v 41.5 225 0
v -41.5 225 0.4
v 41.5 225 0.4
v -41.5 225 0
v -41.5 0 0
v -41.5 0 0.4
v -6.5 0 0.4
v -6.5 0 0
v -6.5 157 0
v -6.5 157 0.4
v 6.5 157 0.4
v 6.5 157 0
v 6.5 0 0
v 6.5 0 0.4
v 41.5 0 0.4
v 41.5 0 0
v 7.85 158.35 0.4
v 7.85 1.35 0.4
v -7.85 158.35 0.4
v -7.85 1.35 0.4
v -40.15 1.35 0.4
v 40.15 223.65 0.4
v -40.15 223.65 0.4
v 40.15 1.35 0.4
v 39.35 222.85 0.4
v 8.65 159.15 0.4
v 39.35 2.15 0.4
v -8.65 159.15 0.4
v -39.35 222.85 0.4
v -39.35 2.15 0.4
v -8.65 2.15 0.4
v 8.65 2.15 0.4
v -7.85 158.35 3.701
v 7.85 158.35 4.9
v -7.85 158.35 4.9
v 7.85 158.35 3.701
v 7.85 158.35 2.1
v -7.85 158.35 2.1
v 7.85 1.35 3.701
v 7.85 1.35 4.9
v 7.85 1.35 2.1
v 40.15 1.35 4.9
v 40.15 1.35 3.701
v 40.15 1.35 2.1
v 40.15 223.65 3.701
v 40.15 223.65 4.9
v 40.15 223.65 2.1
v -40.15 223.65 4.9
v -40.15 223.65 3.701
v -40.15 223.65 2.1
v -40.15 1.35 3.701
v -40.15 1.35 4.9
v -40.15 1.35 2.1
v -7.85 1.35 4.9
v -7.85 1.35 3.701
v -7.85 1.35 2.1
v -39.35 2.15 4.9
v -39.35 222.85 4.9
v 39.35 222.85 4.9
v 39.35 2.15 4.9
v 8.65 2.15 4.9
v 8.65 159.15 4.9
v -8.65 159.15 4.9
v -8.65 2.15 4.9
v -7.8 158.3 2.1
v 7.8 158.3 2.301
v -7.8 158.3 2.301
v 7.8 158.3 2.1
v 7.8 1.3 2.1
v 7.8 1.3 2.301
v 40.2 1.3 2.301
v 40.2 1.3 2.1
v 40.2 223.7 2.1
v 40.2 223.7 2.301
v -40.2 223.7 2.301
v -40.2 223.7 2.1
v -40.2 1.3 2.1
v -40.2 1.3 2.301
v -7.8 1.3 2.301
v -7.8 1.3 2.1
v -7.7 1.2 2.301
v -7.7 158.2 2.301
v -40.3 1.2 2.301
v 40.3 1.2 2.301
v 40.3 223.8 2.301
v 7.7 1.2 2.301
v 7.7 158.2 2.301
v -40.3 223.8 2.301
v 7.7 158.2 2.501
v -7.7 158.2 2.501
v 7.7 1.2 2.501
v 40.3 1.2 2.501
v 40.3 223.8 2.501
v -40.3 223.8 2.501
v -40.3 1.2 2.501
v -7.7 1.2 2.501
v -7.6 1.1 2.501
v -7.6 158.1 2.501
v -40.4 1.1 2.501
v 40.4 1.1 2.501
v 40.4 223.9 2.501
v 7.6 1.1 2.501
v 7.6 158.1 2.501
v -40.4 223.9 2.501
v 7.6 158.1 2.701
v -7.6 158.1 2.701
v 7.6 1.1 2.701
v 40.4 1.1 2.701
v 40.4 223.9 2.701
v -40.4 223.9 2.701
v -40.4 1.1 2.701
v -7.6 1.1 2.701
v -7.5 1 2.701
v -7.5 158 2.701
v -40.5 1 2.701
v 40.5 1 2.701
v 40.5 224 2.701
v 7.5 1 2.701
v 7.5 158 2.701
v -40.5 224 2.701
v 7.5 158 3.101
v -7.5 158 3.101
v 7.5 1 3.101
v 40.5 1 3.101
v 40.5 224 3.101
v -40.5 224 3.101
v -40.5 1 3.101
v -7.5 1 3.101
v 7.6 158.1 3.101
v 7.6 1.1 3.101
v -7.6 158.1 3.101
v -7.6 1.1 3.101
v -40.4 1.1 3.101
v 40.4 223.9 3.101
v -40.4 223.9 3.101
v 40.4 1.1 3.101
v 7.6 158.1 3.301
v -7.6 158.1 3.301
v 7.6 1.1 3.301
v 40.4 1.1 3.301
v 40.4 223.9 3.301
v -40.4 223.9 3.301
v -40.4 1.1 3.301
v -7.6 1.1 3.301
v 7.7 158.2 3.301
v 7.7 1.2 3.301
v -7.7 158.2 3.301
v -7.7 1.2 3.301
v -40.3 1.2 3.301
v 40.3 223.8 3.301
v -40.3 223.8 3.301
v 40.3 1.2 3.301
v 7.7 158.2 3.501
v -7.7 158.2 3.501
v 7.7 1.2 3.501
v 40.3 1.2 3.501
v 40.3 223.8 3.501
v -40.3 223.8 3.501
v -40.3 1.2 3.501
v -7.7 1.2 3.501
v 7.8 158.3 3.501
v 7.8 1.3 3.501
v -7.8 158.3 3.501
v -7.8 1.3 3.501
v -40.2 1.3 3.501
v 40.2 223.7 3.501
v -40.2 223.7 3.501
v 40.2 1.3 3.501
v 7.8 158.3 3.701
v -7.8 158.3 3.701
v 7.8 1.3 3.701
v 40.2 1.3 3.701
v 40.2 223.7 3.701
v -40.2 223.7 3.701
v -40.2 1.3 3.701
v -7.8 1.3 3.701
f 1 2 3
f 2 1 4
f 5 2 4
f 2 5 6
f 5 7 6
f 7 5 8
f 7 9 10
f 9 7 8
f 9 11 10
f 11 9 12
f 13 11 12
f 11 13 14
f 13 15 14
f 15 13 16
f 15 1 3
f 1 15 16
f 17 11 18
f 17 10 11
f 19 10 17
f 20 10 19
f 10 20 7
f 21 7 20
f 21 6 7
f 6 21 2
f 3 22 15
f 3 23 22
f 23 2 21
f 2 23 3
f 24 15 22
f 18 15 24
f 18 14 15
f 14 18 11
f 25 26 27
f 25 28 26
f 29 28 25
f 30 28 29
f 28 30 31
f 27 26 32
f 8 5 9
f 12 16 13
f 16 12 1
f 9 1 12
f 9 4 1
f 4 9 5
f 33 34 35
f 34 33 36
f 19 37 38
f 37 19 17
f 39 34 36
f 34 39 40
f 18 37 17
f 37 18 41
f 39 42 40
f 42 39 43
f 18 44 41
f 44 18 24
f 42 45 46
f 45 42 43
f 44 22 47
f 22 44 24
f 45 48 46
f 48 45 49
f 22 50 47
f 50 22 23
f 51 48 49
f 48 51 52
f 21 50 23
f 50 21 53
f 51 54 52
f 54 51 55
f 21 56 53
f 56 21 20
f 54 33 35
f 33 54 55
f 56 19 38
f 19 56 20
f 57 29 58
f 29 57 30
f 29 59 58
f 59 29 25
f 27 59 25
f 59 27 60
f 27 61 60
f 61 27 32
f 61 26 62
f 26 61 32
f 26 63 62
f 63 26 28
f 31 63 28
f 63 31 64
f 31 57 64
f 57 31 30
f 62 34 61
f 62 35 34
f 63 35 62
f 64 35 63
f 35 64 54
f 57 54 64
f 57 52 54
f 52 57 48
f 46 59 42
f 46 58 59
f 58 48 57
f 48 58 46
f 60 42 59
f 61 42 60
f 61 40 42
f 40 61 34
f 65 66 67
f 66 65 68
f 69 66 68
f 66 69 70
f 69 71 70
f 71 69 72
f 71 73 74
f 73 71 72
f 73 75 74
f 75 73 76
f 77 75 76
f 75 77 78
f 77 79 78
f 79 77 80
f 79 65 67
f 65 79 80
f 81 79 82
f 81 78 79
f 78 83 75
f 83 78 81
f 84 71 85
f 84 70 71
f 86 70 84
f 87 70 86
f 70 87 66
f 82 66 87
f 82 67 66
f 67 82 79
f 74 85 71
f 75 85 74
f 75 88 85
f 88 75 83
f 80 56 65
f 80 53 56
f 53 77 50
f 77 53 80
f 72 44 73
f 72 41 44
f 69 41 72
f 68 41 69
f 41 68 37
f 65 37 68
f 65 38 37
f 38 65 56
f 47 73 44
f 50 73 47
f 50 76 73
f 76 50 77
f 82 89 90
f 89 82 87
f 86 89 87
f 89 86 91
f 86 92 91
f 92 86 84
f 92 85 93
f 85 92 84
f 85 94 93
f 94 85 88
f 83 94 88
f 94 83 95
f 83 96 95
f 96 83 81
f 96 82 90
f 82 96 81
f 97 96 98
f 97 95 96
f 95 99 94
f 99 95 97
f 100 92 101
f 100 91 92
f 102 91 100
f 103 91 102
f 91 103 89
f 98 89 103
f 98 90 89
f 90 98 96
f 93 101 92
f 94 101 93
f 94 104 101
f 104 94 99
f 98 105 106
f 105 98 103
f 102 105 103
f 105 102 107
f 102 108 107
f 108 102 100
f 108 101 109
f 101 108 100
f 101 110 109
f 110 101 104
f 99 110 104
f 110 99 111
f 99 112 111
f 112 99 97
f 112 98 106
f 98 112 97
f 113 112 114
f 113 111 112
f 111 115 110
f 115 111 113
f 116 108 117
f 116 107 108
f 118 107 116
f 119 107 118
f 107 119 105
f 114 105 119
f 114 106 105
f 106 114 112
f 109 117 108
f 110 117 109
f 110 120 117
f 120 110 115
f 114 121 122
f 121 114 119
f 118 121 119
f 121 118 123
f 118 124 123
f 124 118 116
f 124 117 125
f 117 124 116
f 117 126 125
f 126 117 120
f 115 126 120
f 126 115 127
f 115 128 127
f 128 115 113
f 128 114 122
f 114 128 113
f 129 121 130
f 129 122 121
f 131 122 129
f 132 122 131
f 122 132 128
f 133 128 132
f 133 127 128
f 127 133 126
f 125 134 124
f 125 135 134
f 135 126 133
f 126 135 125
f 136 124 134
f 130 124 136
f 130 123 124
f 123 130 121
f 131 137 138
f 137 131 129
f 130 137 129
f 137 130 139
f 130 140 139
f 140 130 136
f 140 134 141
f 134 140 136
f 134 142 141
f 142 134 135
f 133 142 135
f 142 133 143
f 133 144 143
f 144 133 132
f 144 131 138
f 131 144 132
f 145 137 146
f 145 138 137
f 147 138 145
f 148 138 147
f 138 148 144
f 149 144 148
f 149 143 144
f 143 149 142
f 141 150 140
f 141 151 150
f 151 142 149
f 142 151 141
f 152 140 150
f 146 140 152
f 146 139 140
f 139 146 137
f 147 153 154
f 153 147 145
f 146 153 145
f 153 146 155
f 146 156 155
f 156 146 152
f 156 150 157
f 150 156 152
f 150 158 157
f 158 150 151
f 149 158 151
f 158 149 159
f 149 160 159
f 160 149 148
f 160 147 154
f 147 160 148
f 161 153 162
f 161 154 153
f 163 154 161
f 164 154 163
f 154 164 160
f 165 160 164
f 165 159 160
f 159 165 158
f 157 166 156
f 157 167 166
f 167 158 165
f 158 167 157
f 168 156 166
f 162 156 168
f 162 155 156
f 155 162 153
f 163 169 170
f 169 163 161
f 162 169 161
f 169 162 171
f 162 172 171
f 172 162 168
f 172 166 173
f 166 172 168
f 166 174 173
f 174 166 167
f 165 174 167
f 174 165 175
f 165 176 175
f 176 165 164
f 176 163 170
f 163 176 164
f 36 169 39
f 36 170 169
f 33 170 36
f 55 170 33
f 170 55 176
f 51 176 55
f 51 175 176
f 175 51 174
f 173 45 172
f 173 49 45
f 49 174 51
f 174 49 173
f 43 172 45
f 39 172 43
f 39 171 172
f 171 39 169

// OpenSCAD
// ==========================================================================
//  GENERATED FILE -- DO NOT EDIT.
//  Produced by build/build.py from components/Sand_Ballast_Container_Lid.scad
//  Turtle Body version 6.7.4
//  Edit lib/ and src/ instead, then run: python3 build/build.py
// ==========================================================================
/*
 Hope Turtle sand ballast container -- lid (snap-on lid). Units: mm. License: CERN-OHL-S-2.0.
 EXPERIMENTAL -- not built, filled or tested.
 A 3D-printed U-shaped box that slides into the gap between the bottom
 bottle's base and the ballast's orange bottom board, its two arms either
 side of the yellow ballast fin. Fill the tray with sand, click the lid on,
 slide it under the bottle. Walls 0.4 mm (one extrusion line).
 Print plate down, skirt up (part="print", the default) -- no support.
 The matching tray is Sand_Ballast_Container_Bottom.scad.

 SOURCE FILE — geometry lives in lib/sand_ballast.scad + lib/params.scad.
 The committed self-contained file is generated by build/build.py.
*/

/* [Display] */
part = "print"; // [print,closed]  -- print = this piece alone in its print pose; closed = tray + lid together

// [bundle] begin use <../../lib/sand_ballast.scad>
// ==========================================================================
//  Turtle Body -- sand ballast container  (lib module)  EXPERIMENTAL
// --------------------------------------------------------------------------
//  A 3D-printed U-shaped box (bottom tray + snap-on lid) that the builder
//  fills with sand, clicks shut and slides into the gap between the bottom
//  (+Y port) bottle's base and the ballast's orange bottom board. The two
//  arms of the U pass either side of the yellow ballast fin; the U's closed
//  end (the bridge) lies past the board's back edge. Tight under the bottle,
//  it holds the bottle in place.
//
//  Ballast-local frame (lib/ballast_fin.scad): board on Z 0..t, board long
//  axis X, board width Y 0..bl_board_w(); bottle axis at
//  [bl_center_slot(), bl_core_w()/2]; yellow fin centred on X =
//  bl_center_slot(), running from Y = bl_center_slot_depth() +
//  bl_fin_slot_depth() toward -Y.
//
//  Box frame (this file): X across the box, centred on the fin slot; Y = 0
//  at the open (fin-side) end, +Y toward the bridge; Z = 0 the floor
//  underside. sb_installed() maps it into the ballast-local frame.
//
//  Not built, filled or tested. 0.4 mm walls are a single extrusion line.
//
//  Definitions only. Geometry is emitted by the modules below.
// ==========================================================================

// [bundle] begin use <params.scad>
// ==========================================================================
//  Turtle Body -- shared dimension contract
// --------------------------------------------------------------------------
//  The single source of truth for every dimension that more than one
//  subsystem depends on. Values are exposed as zero-argument functions so
//  this file can be pulled in with `use <params.scad>` (which ignores
//  top-level variable assignments) without polluting any namespace.
//
//  lib/ modules take these as DEFAULT argument values:
//      module control_cap(roof_t = p_cap_roof_t(), ...) { ... }
//  so a src/ wrapper can still override one value from its customizer block
//  while every other subsystem keeps the shared number.
//
//  Rules:
//   * one function per concept, canonical name (see CLAUDE.md cross-file table)
//   * derived values are functions of other p_*() functions, never re-typed
//   * mm throughout; names say _d (diameter), _r (radius), _t (thickness),
//     _len / _h (axial), _af (hex across-flats)
//   * do NOT add a bare `x = ...;` here -- bundle.py / lint.py will reject it
// ==========================================================================

// ---- tolerances and render quality --------------------------------------
function p_eps()          = 0.02;   // Boolean overlap / cut-through fudge
function p_fit_clearance() = 0.2;   // wood joint: TOTAL extra slot width, centred on the board
function p_fn_plastic()   = 120;    // printed PLA parts (cap, cage, axle, mold)
function p_fn_wood()      = 96;     // cut wooden parts
function p_fn_curve()     = 180;    // fine profile curves (bottle, sails)

// ---- bottle (the foundation reference) ---------------------------------
function p_bottle_d()        = 84;    // outside diameter (was 86, and 82 before that; other bottle dims held)
function p_bottle_h()        = 305;   // total height incl. ordinary screw cap
function p_bottle_wall_t()   = 0.5;   // modelling assumption, not a measurement
function p_bottle_cap_d()    = 31;    // ordinary screw cap (NOT the control-cap disk)
function p_bottle_cap_h()    = 17;    // ordinary screw cap height (rear-fin / ballast formulas)
function p_collar_d()        = 34;    // bottle collar, independent of cap diameter
function p_top_dome_h()      = 62;
function p_bottom_dome_h()   = 25;
function p_dome_power()      = 2.5;   // superellipse exponent
function p_bottle_neck_h()   = 5;
function p_bottle_collar_h() = 1;
function p_bottle_neck_d()   = p_bottle_cap_d() - 3;   // 28: neck is 3 mm under the cap
function p_bottle_base_ratio() = 0.88; // slightly narrower footprint at the base
function p_bottle_profile_steps() = 16;
// cut bottle (control head): the lower dome is removed and a short socket is
// bored so the control-cap insert slides in. Cut plane sits 5 mm above the
// bottom dome height.
function p_bottle_cut_extra()  = 5;
function p_bottle_cut_height() = p_bottom_dome_h() + p_bottle_cut_extra();   // 30

// nominal bottle interior and the cap insert that enters it
function p_bottle_socket_d() = p_bottle_d() - 2 * p_bottle_wall_t();          // 81
function p_insert_shaft_radial_clearance() = 1;
function p_insert_shaft_d()  = p_bottle_socket_d()
                             - 2 * p_insert_shaft_radial_clearance();          // 79

// ---- wooden stock -----------------------------------------------------
function p_wood_t()          = 12;    // shared board / slat thickness
function p_fin_board_w()     = 93;    // shared fin-system stock width
function p_screw_side_offset() = 17;  // mounting-hole inset from a John end (was 25 until v4.2.0)

// ---- Ecojoiner port --------------------------------------------------
// A port must swallow the bottle's tapered top (the top dome) plus a seating
// allowance, so its axial length is DERIVED from the bottle, not fixed. This
// is the same rule the HopeTurtles.org generators use
// (port_length = taper_height + port_allowance); until 2026-09-08 lib carried
// the evaluated constant 82 instead, which silently broke the rule for any
// bottle other than the reference one. Ballast and Ecojoiner both read it.
function p_port_allowance()  = 20;                 // seating allowance beyond the dome
function p_port_length()     = p_top_dome_h() + p_port_allowance();   // 62 + 20 = 82
function p_port_height()     = p_bottle_d();       // opening height == bottle diameter (asserted)

// ---- M6 hardware ---------------------------------------------------
function p_m6_clearance_d()  = 6.4;   // M6 clearance hole
function p_m6_bolt_shaft_d() = 6;     // visual placeholder only
function p_m6_bolt_head_d()  = 12;
function p_m6_bolt_head_t()  = 4;

// ---- Ecojoiner bottle clamp: M5 cap screws + acorn nuts (v5.0.0/v5.1.0) --
// Replaces the M6 bolt + 12 mm presser disk. Each John port end carries TWO
// black M5 x 30 socket-head cap screws, stacked across the John height (one
// above, one below the centreline). v5.1.0: no nut -- each screw BITES into
// a 5.2 mm hole in the wood (builder's research; not verified here), so the
// screw itself holds its position and is adjusted with a hex key from
// outside. A black acorn (cap) nut, run fully onto the tip, bears on the
// bottle. Hardware sizes are ISO 4762 / DIN 1587 nominals for visual and
// stack checks only -- measure the hardware you buy.
// Bite-fit hole (was 5.5 clearance in v5.0.0). NOTE it is slightly LARGER
// than the 5 mm nominal major diameter: the hold relies on wood fibre
// springback around the thread, per the builder's own tests -- unverified
// here, and likely to vary with species, moisture and drill quality.
function p_m5_hole_d()           = 5.2;
function p_m5_bolt_d()           = 5;     // visual shank (plain cylinder)
function p_m5_bolt_len()         = 30;    // shank length under the head
function p_m5_head_d()           = 8.5;   // ISO 4762 socket head
function p_m5_head_h()           = 5;
function p_m5_acorn_af()         = 8;
function p_m5_acorn_h()          = 10;    // overall, hex base to dome tip
function p_m5_acorn_thread_depth() = 7;   // usable thread before the bolt bottoms
// Pair layout, shared by the John holes and every board bolted through them
// (rear-fin shafts, ballast core slats): each bolt sits this far in from a
// John long edge, i.e. +-p_eco_screw_pair_offset() from the John centreline.
function p_eco_screw_edge_inset()  = 12;   // was 10 until v5.2.0
function p_eco_screw_pair_offset() =
    (p_port_height() - 2 * p_wood_t()) / 2 - p_eco_screw_edge_inset();   // 18

// ---- pressor (EXPERIMENTAL, v6.6.1; lib/pressor.scad, CLAUDE.md s13a) ----
//  A board block in the port gap between a Little John and the bottle,
//  concave-cut to the bottle radius. The John's M5 pair passes into two
//  plain clearance holes in its back edge and pushes it onto the bottle as
//  the screws are turned in -- replaces the acorn nut. Two per port, one
//  each side of the bottle.
function p_pressor_t()          = 15;    // v6.7.4: pressor board thickness (along the bottle axis);
                                          // its own stock, the Johns stay on p_wood_t() 12
function p_pressor_wrap()       = p_bottle_d() / 4;  // 21: inner edge reaches this far past the
                                                      // bottle's tangent line, toward its axis
function p_pressor_travel()     = 1;     // screw-in travel: gap left at the John face when pressed
function p_pressor_hole_d()     = 6;     // v6.7.4: plain Ø6 clearance hole for the John's M5 screw
                                          // (was a 5.3 x 25.3 pill slot; the Johns keep p_m5_hole_d() 5.2)
function p_pressor_hole_depth() = 8;     // hole depth into the pressor's back edge (v6.6.4: was 10)
function p_pressor_min_wall()   = 3;     // least wood around / beyond a screw hole (asserted)
function p_pressor_end_trim()   = 1.5;   // v6.6.4: taken off EACH end (top/bottom edge) -- the printed
                                          // prototype was 3 mm too long to enter the port

// ---- control cap (large stationary disk; see CLAUDE.md s7) ----------
//  TB-03 resolution: repository 5 mm roof / 2 mm boss is authoritative;
//  the axle (below) is derived to this datum.
function p_cap_disk_d()      = 102;   // control-cap disk (independent of p_bottle_cap_d; was 100, +2 mm)
function p_cap_roof_t()      = 5;     // disk / roof thickness
function p_cap_boss_depth()  = 0;     // extra projection of the centre boss into the hollow cap.
                                       // 0 = no boss, flat cavity ceiling (v6.5.1; was 1.5, before that 2)
function p_cap_boss_d()      = 18;
function p_cap_insert_len()  = 35;    // straight insert shaft length
function p_cap_insert_wall_t() = 4;
function p_cap_entry_chamfer_h()     = 1;
function p_cap_entry_chamfer_delta() = 1;
function p_cap_axle_bore_d() = 6;     // loose: 0.5 mm radial clearance to the Ø5 steel shaft (was 8.7 for Ø8 PLA)
function p_cap_cage_radial_clearance() = 1;   // cap disk -> cage inner wall (radial)
function p_cap_total_h()     = p_cap_roof_t() + p_cap_insert_len();           // 40
function p_cap_bearing_len() = p_cap_roof_t() + p_cap_boss_depth();           // 5 (was 6.5, 7)

// buttons (through both cap and cage)
function p_button_upper_d()  = 17;    // clearance hole in the cap
function p_button_axis()     = "y";   // "x" or "y"
function p_button_radius()   = 25;    // radial position of the two button centres (50 mm apart;
                                       // was 24 / 48 mm -- shared with the cage's matching bore)

// ---- silicone seal grooves + rings (CLAUDE.md s8) ------------------
function p_seal_groove_count()      = 2;
function p_seal_groove_axial_h()    = 2.7; // groove height (was 3.5; retuned to just clear
                                            // the 2.6 mm ring axial thickness below, 0.1 mm margin)
function p_seal_groove_radial_depth() = 2; // groove depth
function p_seal_groove1_from_shoulder() = 12;  // groove centre, measured from the insert SHOULDER
function p_seal_groove2_from_shoulder() = 25;
function p_seal_ring_axial_t()      = 2.6;  // cast ring thickness (was 3)
function p_seal_ring_radial_w()     = 10;   // cast ring radial width (was 5; doubled). NOT validated.
function p_seal_ring_elasticity_reduction() = 0.25;
    // Cast the ring's inner diameter this fraction SMALLER than the groove
    // root it mates to, so real (stretchy) silicone is under tension --
    // and therefore actually grips -- once stretched onto the cap, instead
    // of sitting at a 1:1 as-cast fit. Tweak this here as real silicone
    // behaviour is characterized; NOT validated (see lib/silicone_ring_mold.scad).
function p_seal_groove_root_d() = p_insert_shaft_d()
                                - 2 * p_seal_groove_radial_depth();            // 79 at the 86 mm bottle

// ---- sail shaft: uniform round centre axle (CLAUDE.md s9) ----------
//  Derived to the 5/2 cap datum (TB-03/TB-04). round_inside_cap is measured
//  from the roof underside and INCLUDES the boss -- do not add the boss again.
//  TB-08: the shaft is now one uniform round bar top to bottom -- no hex
//  section. It free-spins in the cap bore (p_cap_axle_bore_d) and passes
//  with a light running clearance through the cage hub bore and the top
//  sail bar's own hole (both p_axle_shaft_hole_d()); it locks to the
//  ROTATING cage with a single M3 set screw through the cage hub
//  (p_cage_setscrew_pilot_d()) rather than a shaped (hex) interference fit.
function p_axle_round_d()        = 5;    // Ø5 steel rod (v6.4.0; was an Ø8 printed PLA shaft)
function p_axle_round_ext()      = 1;    // projection above the cap's outer face
function p_axle_round_inside_cap() = p_cap_insert_len() - 5;  // 30: roof underside to round end (incl. boss)
function p_axle_round_len()      = p_axle_round_inside_cap() + p_cap_roof_t() + p_axle_round_ext();  // 36
function p_axle_upper_len()      = 23;   // continues up through the cage hub + sail bar (was the hex length)
function p_axle_total_len()      = p_axle_upper_len() + p_axle_round_len();
function p_axle_shaft_clearance() = 0.4; // snug fit, diametral (was 0.2 on the Ø8 shaft): any hole the shaft passes
                                          // (but does not bear in) is p_axle_round_d() + this
function p_axle_shaft_hole_d()   = p_axle_round_d() + p_axle_shaft_clearance();  // 5.4 (cage hub bore)
function p_magnet_d()            = 3;    // AS5600 sensing magnet recess
function p_magnet_t()            = 1;

// ---- axle rotary shaft O-ring (waterproofs the axle bore; cast in the mold) ----
//  A round-section O-ring seated in a gland in the control-cap bore, sealing
//  against the spinning round section of the axle. ID is tied to the shaft.
function p_axle_oring_cs()     = 2.0;                                   // cross-section
function p_axle_oring_id()     = p_axle_round_d();                      // 5 -- hugs the shaft
function p_axle_oring_od()     = p_axle_oring_id() + 2 * p_axle_oring_cs();          // 9
function p_axle_oring_mean_r() = (p_axle_oring_id() + p_axle_oring_cs()) / 2;        // 3.5
//  gland cut into the cap bore for it
function p_cap_oring_squeeze()      = 0.25;  // radial squeeze on the seal
function p_cap_oring_gland_od()     = p_axle_oring_od() - 2 * p_cap_oring_squeeze(); // 8.5
function p_cap_oring_gland_w()      = 1.3 * p_axle_oring_cs();                       // 2.6 axial
function p_cap_oring_gland_from_face() = p_cap_bearing_len() / 2; // gland centre, from the cap outer face, along the bore
                                         // (2.5 = mid-roof since the boss went in v6.5.1; was 3.5)

// ---- rotating control cage (CLAUDE.md s6) ------------------------
function p_cage_wall_t()     = 6.5;   // radial wall thickness
function p_cage_roof_t()     = 4;     // roof / surface plate thickness
function p_cage_inner_d()    = p_cap_disk_d() + 2 * p_cap_cage_radial_clearance();   // 102
function p_cage_outer_d()    = p_cage_inner_d() + 2 * p_cage_wall_t();               // 115
function p_cage_skirt_depth()   = 44;   // roof underside to the ORIGINAL skirt rim
function p_cage_peak_extension() = 20;  // crest extends this far past the original rim
function p_cage_valley_wall_h()  = 10;  // minimum wall depth between mounts
function p_cage_total_h()    = p_cage_skirt_depth() + p_cage_roof_t();              // 48 (native)
function p_cage_notch_count()   = 4;
function p_cage_notch_w()    = 22.5;  // batten groove width
function p_cage_notch_depth() = 3.7;
function p_cage_wave_segments() = 240;
function p_cage_hub_d()      = 29;
function p_cage_pocket_d()   = 26;    // top clip pocket (control_cage top_pocket, OFF by default)
function p_cage_pocket_depth() = 4;   //   "        "     "
// TB-08: hex bore replaced by a plain round bore (p_axle_shaft_hole_d(),
// shared with the sail bar) + a radial M3 set screw that locks the cage to
// the shaft -- see p_cage_setscrew_*() below.
function p_cage_bearing_d()  = 9;     // hemispherical bearing bump
function p_cage_bearing_count() = 8;
function p_cage_bearing_pcd() = p_cap_disk_d() - p_cage_bearing_d() + 0.5;          // 91.5
function p_cage_top_hole_d() = 18;    // button / access hole through the roof (v6.5.2: back to 18 from 22;
                                       // the 22 opened onto the hub for set-screw access, off since v6.0.0)
function p_cage_mount_hole_d() = 3.2; // two M3 clearance holes per batten / groove
function p_cage_mount_pitch()  = 32;  // vertical pitch of the pair
function p_cage_lower_hole_from_tip() = 10;
// Single radial M3 set (grub) screw through the hub wall, pressing on the
// shaft to lock cage <-> shaft rotation (TB-08). Self-tapping into the
// printed PLA hub -- not a clearance hole for a separate nut, unlike the
// batten/mount M3 holes above. Pilot diameter is an untested starting
// point (typical M3-into-rigid-plastic self-tap pilots run 2.5-2.8 mm) --
// verify real thread engagement and tapping torque before relying on it.
function p_cage_setscrew_pilot_d() = 2.5;
// v6.0.0: the hub set screw (and its access recess) is switched OFF -- the
// M3 in the sail crossbar connector now clamps the shaft. Kept, not deleted,
// so it can be turned back on.
function p_cage_setscrew_enabled() = false;
// Flat-floored access recess around the set screw, cut into the hub face the
// roof button opening uncovers, running the hub's full height (roof top down
// through the hub bottom). Width is tangential, depth is radial (inward from
// the opening's inner edge).
function p_cage_setscrew_recess_w()     = 5;
function p_cage_setscrew_recess_depth() = 3;
// Set-screw angle is no longer a separate parameter: control_cage() aims it
// at the centre of the roof button opening (button_angle) so a hex key can
// reach it through that opening.
// 45-deg outward chamfer on the roof-top outer edge (0 = sharp). The cage
// prints roof-face-down, so this bevel flares OUT from the bed and stays
// printable; it runs the full perimeter, batten grooves included. See
// lib/control_cage.scad.
function p_cage_roof_bevel() = 3;

// ---- sail apparatus (CLAUDE.md s10) ---------------------------
// SAIL battens. v6.0.0: the upper notch holds two stacked layers (connector
// below, crossbar half above), so the batten grew by the extra layer: 205 +
// 2t (229) at first, trimmed back by t to 205 + t (217) in v6.1.0 so 15 mm of
// batten stands above the notch again. Batten bottom, cage M3 holes and the
// lower rails do not move. The NON-sail battens are shorter: their top is
// flush with the cage roof top (derived in lib/sail_frame.scad, 178 mm).
function p_side_batten_h()   = 205 + p_wood_t();       // 217
function p_side_batten_w()   = 20;
// v6.5.0: battens are cut from the same board as every other slat (were a
// separate 20 x 10 stock), so their radial thickness -- and every slot that
// takes a batten -- is the board thickness.
function p_side_batten_radial_t() = p_wood_t();     // 12 (was 10)
// Top crossbar span, tip to tip: 6 x bottle_d (504). v6.1.0 briefly made each
// half a head-fin-slat length (span 843.6); v6.2.0 reverted it -- the sails
// came out too big. The halves are derived from this span.
function p_top_crossbar_len() = 6 * p_bottle_d();   // 504 (halves 212.2 each)
function p_top_crossbar_w()  = 22;
function p_top_crossbar_t()  = p_wood_t();          // 12
// v6.0.0: the top crossbar is split into a LEFT and RIGHT half plus a
// centre "sail crossbar connector". The connector lies on the cage roof and
// spans between the two sail battens; each half lies on top of it and runs
// out to its tip. Both layers half-lap into the same (now 2t tall) sail-batten
// notch, and one M3 per side screws the half down into the connector.
// The shaft passes the connector with generous clearance (no bearing), and an
// M3 self-tapped in from the connector's side face clamps it, locking frame,
// cage and shaft together (replaces the cage hub set screw).
function p_sail_connector_axle_hole_d()  = 6;     // Ø5 steel shaft, 0.5 mm radial clearance (v6.4.0; was 9 for the Ø8 shaft)
function p_sail_m3_pilot_d()             = 2.8;   // self-tap pilot: clamp screw + the half-to-connector screws
function p_sail_m3_clear_d()             = p_cage_mount_hole_d();   // 3.2, through the top (half) layer
function p_sail_connector_overhang()     = 15;    // connector past each sail batten's outer face
function p_sail_bar_half_inboard()       = 15;    // each half runs this far inboard of its batten
function p_bottom_rail_len() = 3 * p_bottle_d() + p_wood_t();   // 264 (v6.3.0: +t; 252 in v6.2.0, 360 in v6.1.0)
function p_bottom_rail_bottle_clearance() = 1;
function p_sail_rail_color()  = [0.56, 0.39, 0.39]; // brown (top AND bottom rails)
function p_c_piece_color()    = [1.0, 0.52, 0.20];  // orange, retained

// ---- rear fin + solar support (CLAUDE.md s11) ----------------
function p_solar_panel_w() = 148;
function p_solar_panel_h() = 223;
function p_solar_panel_t() = 2.5;    // real panel, independent of wood thickness
// The green shafts overlap the yellow fin over X = 0..p_rear_shaft_rear_x()
// (the half-lap zone, 84 mm). v5.3.0: the bottle base must ABUT the fin's
// front edge (X = 0) so the fin holds the bottle in its port -- previously
// the full turtle seated the bottle base at the shafts' rear end, putting the
// first 84 mm of the fin inside the bottle. The shaft front (and its John
// hole pair) stays where it was, so the shafts grow by exactly that overlap:
//   334 (old approved formula) + 84 = 418.
// v5.7.0: the yellow fin is exactly one board wide (it was board + a 15 mm
// "rear tab", 108 mm -- wider than the 93 mm board it is cut from), so the
// overlap is board width - 2t: 84 -> 69, shaft 418 -> 403, half-lap 42 -> 34.5.
function p_rear_shaft_rear_x() = p_fin_board_w() - 2 * p_wood_t();             // 69
function p_rear_shaft_len() = p_bottle_h()
                            + (2/3) * (p_fin_board_w() - 2 * p_wood_t())
                            - p_bottle_cap_h()
                            + p_rear_shaft_rear_x();                            // 403 (418 v5.3.0-v5.6.0)
function p_rear_half_lap_engagement() = p_rear_shaft_rear_x() / 2;  // 34.5 green/yellow interlock depth
// v5.4.0: the green shaft is as wide as the Ecojoiner John it bolts flush
// against (John height = port height - 2 x stock), so their edges and M5 pair
// line up. Was a fixed 59 -- 1 mm narrower than the 60 mm John, and the M5
// pair (centred on it) sat 11.5 mm in from its edges instead of 12.
function p_rear_shaft_width()   = p_port_height() - 2 * p_wood_t();            // 60
// TB-07: the green-slat mounting hole follows the mating Ecojoiner John, not a
// fixed 50 mm. Derived from the install transform; the john_length/2 terms
// cancel, leaving a pure function of the shared contract (= 113 at defaults).
// v5.3.0: the install now seats the bottle base at fin X = 0 (not at the
// shaft rear, X = p_rear_shaft_rear_x()), so that overlap is subtracted back
// out -- the hole stays 113 mm from the (unmoved) shaft front.
function p_rear_shaft_hole_from_front() =
    p_rear_shaft_len() - p_rear_shaft_rear_x() - p_screw_side_offset()
    - p_bottle_h() + p_bottle_cap_h() + p_port_height();

// ---- head fin: front fin (v5.8.0, EXPERIMENTAL; triangle since v6.3.0) ---------
// The rear fin's mirror on the front (-X / physical 9 o'clock) port: two
// flat slats above and below the front bottle bolt to the same Little John
// M5 pairs and run the length of the bottle; a vertical triangular fin
// half-laps into their outer ends and abuts the bottle base. Not built or
// tested. See lib/head_fin.scad.
//  * fin width (forward, along the bottle axis) = the widest board, so the
//    fin is cut across one board (its height runs along the board's length)
//  * the slats reach exactly as far into the Ecojoiner as the rear shafts,
//    so their M5 pair lands at the same distance from the slat front
function p_head_fin_w()       = p_fin_board_w();                         // 93
function p_head_fin_h()       = p_bottle_d() + 6 * p_wood_t();           // 156: 2t of fin beyond each slat
function p_head_slat_overlap() = 4 * p_wood_t();                         // 48: slat run into the fin
// v6.3.1 profile (v6.3.0 had the slope the other way): the TOP edge runs
// out only to this X (where the slats end); the leading edge slopes down and
// FORWARD from there to a vertical flat "toe" at the full fin width, which
// meets the bottom edge. Full width along the BOTTOM edge.
function p_head_fin_heel_x()  = p_head_slat_overlap();                   // 48: top-edge length
function p_head_fin_toe_h()   = 3 * p_wood_t();                          // 36: vertical flat nose at the bottom front (v6.3.4; was 2t)
// v6.3.2: the fin extends DOWN below p_head_fin_h()'s bottom by this much (top
// unchanged), and its new bottom-front corner is set back, giving a raked
// forefoot below the toe flat.
function p_head_fin_drop()    = 3 * p_wood_t();                          // 36
function p_head_fin_forefoot_setback() = p_head_fin_drop();             // 36: = drop -> 45 deg cut (v6.3.3; was 18)
function p_head_half_lap_engagement() = p_head_slat_overlap() / 2;       // 24
function p_head_slat_reach()  = p_rear_shaft_len() - p_rear_shaft_rear_x();   // 334: bottle base -> slat front
function p_head_slat_len()    = p_head_slat_reach() + p_head_slat_overlap();  // 382
function p_head_slat_width()  = p_rear_shaft_width();                    // 60 == John height
function p_head_slat_hole_from_front() = p_rear_shaft_hole_from_front(); // 113: same reach -> same John pair

// ---- ballast attachment (CLAUDE.md s12) ---------------------
function p_ballast_core_w()   = p_port_height() - 2 * p_wood_t();               // 60 == John height
function p_ballast_core_len() = p_bottle_h() - p_bottle_cap_h() + 6 * p_wood_t();  // 360
function p_ballast_slat_gap() = p_port_height();       // clear inner-face gap
function p_ballast_slat_spacing() = p_port_height() + p_wood_t();               // 96
function p_ballast_board_len() = 3.5 * p_bottle_d() + 2 * p_wood_t();   // 318 (v5.5.0: +2t, 3t ends past the foot slots)
function p_ballast_fin_len()   = 3 * p_bottle_d();     // 246
function p_ballast_lock_w()    = 5 * p_wood_t();       // 60

// ---- neutral wood shades (used when enable_color_coding = false) -------
// With the full colour code off, every wooden subsystem still renders in its
// OWN shade of brown so the parts stay visually separable. All are warm browns
// (R > G > B) spaced by lightness. The two large fins share one darker shade so
// they read as a matched pair, distinct from the rest of their own assembly.
function p_wood_shade_sail()     = [0.85, 0.66, 0.47]; // sail frame  (lightest)
function p_wood_shade_rear_fin() = [0.72, 0.50, 0.33]; // rear-fin shafts + solar holder
function p_wood_shade_eco()      = [0.62, 0.44, 0.28]; // Ecojoiner core
function p_wood_shade_ballast()  = [0.52, 0.34, 0.22]; // ballast slats / board / locks
function p_wood_shade_fin()      = [0.40, 0.26, 0.17]; // rear fin + ballast fin, shared (darkest)
// [bundle] end   <params.scad>
// [bundle] begin use <ballast_fin.scad>
// ==========================================================================
//  Turtle Body -- bottom ballast attachment  (lib module)
// --------------------------------------------------------------------------
//  Two green core slats, one orange bottom board, two red lock feet, one
//  yellow ballast fin. No bottle. See CLAUDE.md s12.
//
//  Use clear inner-face spacing (= bottle_diameter), not centre spacing, for
//  bottle clearance. The yellow fin's bottle-seat cut is enlarged by one
//  stock thickness so the bottle clears it -- preserved here. Ballast joints
//  keep nominal stock slot widths (the rear fin's 0.2 mm allowance is NOT
//  added here).
//
//  Definitions only. Geometry is emitted by local_ballast_assembly() or the
//  individual part modules.
// ==========================================================================

// [bundle] begin use <params.scad>
// [bundle] already inlined: params.scad
// [bundle] end   <params.scad>
// [bundle] begin use <util.scad>
// ==========================================================================
//  Turtle Body -- shared helper modules and functions
// --------------------------------------------------------------------------
//  Small pieces that were copy-pasted across the standalone files. Geometry
//  lives in the per-subsystem lib/ modules; this file is only glue.
//
//  Definitions only -- no top-level geometry, no top-level assignments.
// ==========================================================================

// [bundle] begin use <params.scad>
// [bundle] already inlined: params.scad
// [bundle] end   <params.scad>

// Colour wrapper for wooden parts. When colour coding is off, every wooden
// component renders in one neutral wood tone; bottles, hardware, sails and
// printed parts keep their own colours and never call this.
module wood_color(coded_color, enabled = true, neutral = [0.94, 0.83, 0.62]) {
    color(enabled ? coded_color : neutral) children();
}

// scalar clamp
function clamp(v, lo, hi) = v < lo ? lo : (v > hi ? hi : v);

// Visual-only M6 bolt: plain shaft + hex-less cylindrical head. No thread,
// no torque rating -- a placeholder for fit inspection.
//  Local Z=0 is the underside of the head; the shaft runs toward +Z from Z=0
//  (plus an optional tip_extension), the head sits at Z=-head_t..0. Matches
//  the standalone files.
module m6_bolt_placeholder(grip_length, tip_extension = 1,
                           shaft_d = undef, head_d = undef, head_t = undef,
                           color_rgb = [0.15, 0.15, 0.15], fn = 48) {
    sd = shaft_d == undef ? p_m6_bolt_shaft_d() : shaft_d;
    hd = head_d  == undef ? p_m6_bolt_head_d()  : head_d;
    ht = head_t  == undef ? p_m6_bolt_head_t()  : head_t;
    assert(grip_length > 0, "m6_bolt_placeholder: grip_length must be positive.");
    color(color_rgb)
        union() {
            cylinder(d = sd, h = grip_length + tip_extension, $fn = fn);
            translate([0, 0, -ht])
                cylinder(d = hd, h = ht, $fn = fn);
        }
}

// Regular hexagonal prism specified by across-flats width (OpenSCAD's
// cylinder($fn=6) is specified across corners, which is the usual trap).
module hex_prism_af(across_flats, h, center = false) {
    cylinder(d = across_flats / cos(30), h = h, $fn = 6, center = center);
}
// [bundle] end   <util.scad>

function bl_t()            = p_wood_t();
// The green core slats bolt flush against the Ecojoiner's Little Johns and
// clamp the bottle between them, so they follow the PORT height (== bottle
// diameter here; the HopeTurtles.org generator adds the form's fit offset):
// width == John height, inner-face gap == port height. v5.4.1: written in
// p_port_height() terms (same values) to make that tie explicit.
function bl_core_w()       = p_port_height() - 2 * bl_t();                       // 60 == John height
function bl_core_h()       = p_bottle_h() - p_bottle_cap_h() + 6.0 * bl_t();     // 360
function bl_lower_lobe()   = 2 * bl_t();
function bl_upper_lobe()   = 2 * bl_t();
function bl_core_slot_h()  = bl_t();
function bl_core_slot_depth() = bl_core_w() / 2;
function bl_neck_w()       = p_port_height() - 3 * bl_t();                       // 48
function bl_shoulder_step()   = bl_core_w() - bl_neck_w();                       // 12
// Distance from the slat top down to where the upper 45-degree shoulder cut
// begins. The seated slat top is port_length + t inside the outer John's
// port end, so the cut must start at least that far down or it bites into
// the slat while still inside the John. v5.6.0: was one port_height (84,
// 10 mm inside the John); now one board width lower and never above the
// John end -- max(port_height, port_length) + t (96 at defaults).
function bl_upper_diag_from_top() = max(p_port_height(), p_port_length()) + bl_t();
function bl_upper_diag_start() = bl_core_h() - bl_upper_diag_from_top();
function bl_upper_neck_start() = bl_upper_diag_start() - bl_shoulder_step();
function bl_core_slot_z0() = bl_lower_lobe();
function bl_core_slot_z1() = bl_core_slot_z0() + bl_core_slot_h();
function bl_lower_full_return() = bl_core_slot_z1() + bl_upper_lobe();
function bl_lower_neck_start()  = bl_lower_full_return() + bl_shoulder_step();
function bl_mount_hole_from_top() = p_port_length() + bl_t() - p_screw_side_offset();  // 77
function bl_mount_hole_x()  = bl_core_w() / 2;
function bl_mount_hole_y()  = bl_core_h() - bl_mount_hole_from_top();

function bl_board_len()    = p_ballast_board_len();                              // 318
function bl_board_w()      = p_fin_board_w();                                    // 93
function bl_board_slot_w() = bl_t();
function bl_board_slot_depth()  = p_fin_board_w() / 3;
function bl_center_slot_depth() = p_bottle_d() / 2;
function bl_center_slot()  = bl_board_len() / 2;
function bl_slat_spacing() = p_port_height() + bl_t();                          // 96
function bl_left_slot()    = bl_center_slot() - bl_slat_spacing() / 2;
function bl_right_slot()   = bl_center_slot() + bl_slat_spacing() / 2;
// Solid wood outboard of each red-foot slot. v5.5.0: 2 -> 3 board thicknesses
// (the board grew by 2*t to keep every slot where it was relative to centre)
// so the ends past the foot slots are less likely to split off.
function bl_end_slot_offset() = 3 * bl_t();                                      // 36
function bl_left_end_slot_x0()  = bl_end_slot_offset();
function bl_right_end_slot_x0() = bl_board_len() - bl_end_slot_offset() - bl_board_slot_w();
// 45-degree plan-view chamfer on both corners of the FRONT edge (y = board
// width, the red-foot-slot edge; the yellow fin trails aft from y = 0 in the
// full turtle). Legs are this long along each edge. v5.5.0.
function bl_board_front_chamfer() = 20;

function bl_lock_w()       = 5 * bl_t();                                         // 60
function bl_lock_h()       = 5 * bl_t();
function bl_lock_t()       = bl_t();
function bl_lock_slot_depth() = bl_lock_w() / 2;
function bl_lock_slot_h()  = bl_t();
function bl_lock_chamfer() = 1.5 * bl_t();

function bl_fin_len()      = 3 * p_bottle_d();                                   // 246
function bl_fin_h()        = p_fin_board_w();                                    // 93
function bl_fin_t()        = bl_t();
function bl_fin_lower_protrusion() = 2 * bl_t();
function bl_fin_slot_h()   = bl_t();
function bl_fin_slot_depth()   = p_bottle_d() / 2;
function bl_fin_upper_cut_depth() = p_bottle_d() + bl_t();   // +1 stock thickness so the bottle clears
function bl_fin_upper_cut_z0()    = bl_fin_lower_protrusion() + bl_fin_slot_h() + 1.5 * bl_t();
// One full board thickness of solid material between the chamfer and the
// slot above it (bl_fin_lower_protrusion() - bl_fin_front_chamfer() ==
// bl_t()): was 1.5*bl_t(), leaving only 0.5*bl_t() there -- a thin sliver
// right at the corner between two cuts, weaker than it needs to be.
function bl_fin_front_chamfer()   = bl_fin_lower_protrusion() - bl_t();   // = bl_t()

module bl_assert_valid() {
    t = bl_t();
    assert(p_bottle_h() > p_bottle_cap_h() && t > 0 && p_bottle_d() > 3 * t);
    assert(bl_core_h() - p_bottle_d() - t > 6 * t, "ballast: slat shoulders overlap.");
    assert(p_m5_hole_d() > 0
           && p_eco_screw_pair_offset() + p_m5_hole_d() / 2 < bl_core_w() / 2,
           "ballast: M5 hole pair runs off the core slat edges.");
    assert(bl_mount_hole_from_top() > p_m5_hole_d() / 2
           && bl_mount_hole_from_top() < p_bottle_d() - p_m5_hole_d() / 2,
           "ballast: mount holes miss the upper slat end.");
    assert(p_fin_board_w() > max(4.5 * t, p_bottle_d() / 2), "ballast: fin board too narrow.");
    assert(bl_core_w() == p_port_height() - 2 * t,
           "ballast: slat width must use the shared bottle diameter.");
    assert(bl_core_h() - bl_upper_diag_start() >= p_port_length() + t - 0.001,
           "ballast: top shoulder cut must begin at or below the John's port end.");
    assert(bl_upper_neck_start() > bl_lower_neck_start(),
           "ballast: upper and lower shoulder cuts overlap.");
    assert(abs((bl_slat_spacing() - bl_t()) - p_bottle_d()) < 0.001,
           "ballast: slat inner-face gap must equal the shared bottle diameter.");
    assert(bl_board_front_chamfer() >= 0
           && bl_board_front_chamfer() < bl_end_slot_offset()
           && bl_board_front_chamfer() < bl_board_slot_depth(),
           "ballast: board front chamfer would cut into a red-foot slot.");
    assert(abs(bl_center_slot_depth() - bl_fin_slot_depth()) < 0.001,
           "ballast: orange-base and yellow-fin slots must have equal depth.");
}

// ---- 2D profiles + parts -------------------------------------------
module bl_core_profile_2d()
    polygon([[0, 0], [bl_core_w(), 0],
             [bl_core_w(), bl_core_h()], [0, bl_core_h()],
             [0, bl_upper_diag_start()],
             [bl_shoulder_step(), bl_upper_neck_start()],
             [bl_shoulder_step(), bl_lower_neck_start()],
             [0, bl_lower_full_return()],
             [0, bl_core_slot_z1()],
             [bl_core_slot_depth(), bl_core_slot_z1()],
             [bl_core_slot_depth(), bl_core_slot_z0()],
             [0, bl_core_slot_z0()]]);

module ballast_core_slat_part(colored = true)
    wood_color([0.12, 0.38, 0.20], colored, p_wood_shade_ballast())
        linear_extrude(height = bl_t()) difference() {
            bl_core_profile_2d();
            // M5 pair, matching the Little John's clamp pair (v5.0.0)
            for (dx = [-p_eco_screw_pair_offset(), p_eco_screw_pair_offset()])
                translate([bl_mount_hole_x() + dx, bl_mount_hole_y()])
                    circle(d = p_m5_hole_d(), $fn = 16);
        }

module ballast_bottom_board_part(colored = true) {
    e = 0.01;
    wood_color([0.90, 0.38, 0.06], colored, p_wood_shade_ballast())
    linear_extrude(height = bl_t()) difference() {
        let(L = bl_board_len(), W = bl_board_w(), ch = bl_board_front_chamfer())
            polygon([[0, 0], [L, 0], [L, W - ch], [L - ch, W],
                     [ch, W], [0, W - ch]]);
        translate([bl_left_slot() - bl_board_slot_w() / 2, -e])
            square([bl_board_slot_w(), bl_board_slot_depth() + e]);
        translate([bl_center_slot() - bl_board_slot_w() / 2, -e])
            square([bl_board_slot_w(), bl_center_slot_depth() + e]);
        translate([bl_right_slot() - bl_board_slot_w() / 2, -e])
            square([bl_board_slot_w(), bl_board_slot_depth() + e]);
        translate([bl_left_end_slot_x0(), bl_board_w() - bl_board_slot_depth()])
            square([bl_board_slot_w(), bl_board_slot_depth() + e]);
        translate([bl_right_end_slot_x0(), bl_board_w() - bl_board_slot_depth()])
            square([bl_board_slot_w(), bl_board_slot_depth() + e]);
    }
}

module bl_lock_profile_2d() {
    y0 = (bl_lock_h() - bl_lock_slot_h()) / 2;
    y1 = y0 + bl_lock_slot_h();
    ch = bl_lock_chamfer();
    polygon([[0, 0], [bl_lock_w() - ch, 0], [bl_lock_w(), ch],
             [bl_lock_w(), bl_lock_h() - ch], [bl_lock_w() - ch, bl_lock_h()],
             [0, bl_lock_h()], [0, y1], [bl_lock_slot_depth(), y1],
             [bl_lock_slot_depth(), y0], [0, y0]]);
}

module ballast_lock_part(colored = true)
    wood_color([0.70, 0.12, 0.10], colored, p_wood_shade_ballast())
        linear_extrude(height = bl_lock_t()) bl_lock_profile_2d();

module bl_fin_profile_2d() {
    e = 0.01; ch = bl_fin_front_chamfer();
    difference() {
        polygon([[ch, 0], [bl_fin_len(), 0], [bl_fin_len(), bl_fin_h()],
                 [0, bl_fin_h()], [0, ch]]);
        translate([-e, bl_fin_lower_protrusion()])
            square([bl_fin_slot_depth() + e, bl_fin_slot_h()]);
        translate([-e, bl_fin_upper_cut_z0()])
            square([bl_fin_upper_cut_depth() + e, bl_fin_h() - bl_fin_upper_cut_z0() + e]);
    }
}

// Shares p_wood_shade_fin() with the rear fin so the two large fins read as a
// matched pair, distinct from the rest of the ballast.
module ballast_fin_part(colored = true)
    wood_color([0.95, 0.72, 0.02], colored, p_wood_shade_fin())
        linear_extrude(height = bl_fin_t()) bl_fin_profile_2d();

// ---- local assembly ------------------------------------------------
module bl_installed_green_slat(slot_center_x, colored = true)
    multmatrix([[0, 0, 1, slot_center_x - bl_t() / 2],
                [-1, 0, 0, bl_core_w()],
                [0, 1, 0, -bl_core_slot_z0()],
                [0, 0, 0, 1]])
        ballast_core_slat_part(colored);

module bl_installed_lock(slot_x0, colored = true) {
    lock_center_x = slot_x0 + bl_board_slot_w() / 2;
    lock_origin_y = (bl_board_w() - bl_board_slot_depth()) - bl_lock_slot_depth();
    y0 = (bl_lock_h() - bl_lock_slot_h()) / 2;
    multmatrix([[0, 0, 1, lock_center_x - bl_lock_t() / 2],
                [1, 0, 0, lock_origin_y],
                [0, 1, 0, -y0],
                [0, 0, 0, 1]])
        ballast_lock_part(colored);
}

module bl_installed_fin(inspection_pullout = 0, colored = true) {
    fin_origin_y = bl_center_slot_depth() + bl_fin_slot_depth() + inspection_pullout;
    multmatrix([[0, 0, 1, bl_center_slot() - bl_fin_t() / 2],
                [-1, 0, 0, fin_origin_y],
                [0, 1, 0, -bl_fin_lower_protrusion()],
                [0, 0, 0, 1]])
        ballast_fin_part(colored);
}

module local_ballast_assembly(inspection_pullout = 0, colored = true) {
    bl_assert_valid();
    ballast_bottom_board_part(colored);
    bl_installed_lock(bl_left_end_slot_x0(), colored);
    bl_installed_lock(bl_right_end_slot_x0(), colored);
    bl_installed_green_slat(bl_left_slot(), colored);
    bl_installed_green_slat(bl_right_slot(), colored);
    bl_installed_fin(inspection_pullout, colored);

    echo("BALLAST: slat w/len/t = ", bl_core_w(), bl_core_h(), bl_t(),
         " | inner-face gap = ", bl_slat_spacing() - bl_t(),
         " | M5 pair from slat top = ", bl_mount_hole_from_top());
}
// [bundle] end   <ballast_fin.scad>

// ---- physical inputs ----------------------------------------------------
function sb_wall_t()          = 0.4;   // side walls (one 0.4 mm extrusion line)
function sb_floor_t()         = 0.4;   // tray floor (perpendicular, also on both end chamfers)
function sb_lid_t()           = 0.4;   // lid plate (flat since v6.7.3)
function sb_front_overhang()  = 60;    // past the bottle's fin-side edge; v6.7.3: was 50, now = back
function sb_back_overhang()   = 60;    // past the board's back edge (Y = board width); v6.7.1: was 50
function sb_side_clear()      = 0.5;   // per side, to each green core slat face
function sb_fin_clear()       = 0.5;   // per side, slot wall to the yellow fin
function sb_fin_end_clear()   = 1.0;   // slot root past the fin's inner end
function sb_vert_clear()      = 0.5;   // total, box height below the bottle base

// 45 deg end cuts, in the turtle's cutting style. Since v6.7.3 both ends lose
// their BOTTOM edge (cut upward from the floor, like a sled), so the top and
// the lid are flat. (v6.7.1 cut the front TOP edge, which put a sloped panel
// on the lid.) Each leaves a vertical end face sb_end_face_h() tall.
function sb_end_face_h()      = 8;

// snap ("click") seal: a thickened rim band at the tray top with a V groove,
// and a lid skirt that drops inside the band with a V bead. Depths are
// measured down from the flat top surface.
function sb_rim_t()           = 1.2;   // rim band thickness (inward from the outer face)
function sb_rim_h()           = 5.0;   // rim band depth, below the tray top
function sb_skirt_t()         = 0.8;   // lid skirt thickness
function sb_skirt_fit()       = 0.15;  // per side, skirt outer face to rim inner face
function sb_groove_depth()    = 0.4;   // into the rim band
function sb_bead_depth()      = 0.4;   // out from the skirt (interference = depth - fit)
function sb_snap_h()          = 1.6;   // groove / bead height (V, 45 deg flanks)
function sb_snap_z()          = 2.5;   // groove / bead centre, below the tray top

// ---- derived ------------------------------------------------------------
// Bottle-base gap in the installed turtle. In src/Full_Turtle.scad the green
// slat top starts at the port entrance (outer John face - t), is then pushed
// one port_length into the port (ballast_vertical_lift), and the bottle cap
// is inserted cap_h + port_height past the outer John face. Net:
//   gap = port_height + 2t - port_length   (26 mm at the 84 mm reference).
// The full turtle asserts its placed geometry equals this.
function sb_bottle_gap()      = p_port_height() + 2 * p_wood_t() - p_port_length();

function sb_height()          = sb_bottle_gap() - sb_vert_clear();          // closed box
function sb_tray_h()          = sb_height() - sb_lid_t();                   // tray, flat part
function sb_width()           = p_bottle_d() - 2 * sb_side_clear();         // between slats
function sb_slot_w()          = p_wood_t() + 2 * sb_fin_clear();
function sb_front_chamfer()   = sb_height() - sb_end_face_h();              // 17.5
function sb_back_chamfer()    = sb_height() - sb_end_face_h();              // 17.5

// ballast-local Y of the features the box is sized from
function sb_bottle_axis_y()   = bl_core_w() / 2;
function sb_fin_inner_y()     = bl_center_slot_depth() + bl_fin_slot_depth();
function sb_y0_local()        = sb_bottle_axis_y() - p_bottle_d() / 2 - sb_front_overhang();
function sb_y1_local()        = bl_board_w() + sb_back_overhang();
function sb_length()          = sb_y1_local() - sb_y0_local();
function sb_slot_len()        = sb_fin_inner_y() + sb_fin_end_clear() - sb_y0_local();
function sb_arm_w()           = (sb_width() - sb_slot_w()) / 2;

module sb_assert_valid() {
    assert(sb_bottle_gap() > 0, "sand ballast: no gap between bottle base and board.");
    assert(sb_end_face_h() >= sb_lid_t() + sb_rim_h() + (sb_rim_t() - sb_wall_t())
                              + sb_floor_t() + 1,
           "sand ballast: end faces too short for lid, snap rim and floor.");
    assert(sb_front_chamfer() > 0 && sb_front_chamfer() <= sb_front_overhang(),
           "sand ballast: front cut would reach under the bottle.");
    assert(sb_length() > sb_front_chamfer() + sb_back_chamfer(),
           "sand ballast: end cuts meet -- no flat floor.");
    assert(sb_back_chamfer() > 0 && sb_back_chamfer() <= sb_back_overhang(),
           "sand ballast: back cut would lift the box off the board.");
    assert(sb_arm_w() > 2 * sb_rim_t() + 2 * (sb_skirt_fit() + sb_skirt_t()) + 2,
           "sand ballast: arms too narrow for the rim band and lid skirt.");
    assert(sb_slot_len() < sb_length() - sb_back_chamfer() - 2 * sb_rim_t() - 2,
           "sand ballast: fin slot leaves no bridge at the closed end.");
    assert(sb_y1_local() > sb_fin_inner_y() + sb_fin_end_clear(),
           "sand ballast: bridge would hit the yellow fin.");
    assert(sb_rim_t() - sb_groove_depth() >= sb_wall_t(),
           "sand ballast: groove would cut through the rim band.");
    assert(sb_bead_depth() > sb_skirt_fit(),
           "sand ballast: bead does not interfere with the rim -- no click.");
    assert(sb_snap_h() >= 2 * max(sb_groove_depth(), sb_bead_depth()),
           "sand ballast: snap V flanks flatter than 45 deg -- needs support.");
    assert(sb_snap_z() + sb_snap_h() / 2 < sb_rim_h() - 0.5
           && sb_snap_z() - sb_snap_h() / 2 > 0.5,
           "sand ballast: snap groove/bead runs off the rim band.");
}

// ---- 2D plan outline (box frame, XY) ------------------------------------
// U outline: full rectangle minus the fin slot open at Y = 0.
module sb_outline_2d() {
    e = 0.01;
    difference() {
        translate([-sb_width() / 2, 0]) square([sb_width(), sb_length()]);
        translate([-sb_slot_w() / 2, -e]) square([sb_slot_w(), sb_slot_len() + e]);
    }
}

// band between two inward offsets of the outline (a outer, b > a inner)
module sb_band_2d(a, b)
    difference() {
        offset(delta = -a) sb_outline_2d();
        offset(delta = -b) sb_outline_2d();
    }

// ---- 2D side profiles (box frame, YZ: u = Y, v = Z) ----------------------
// Region below the box's flat top surface (Z = sb_height()), d mm below it.
// Open below / beyond.
function sb_big() = 1000;
module sb_below_top_2d(d) {
    B = sb_big(); H = sb_height();
    translate([-B, -B]) square([2 * B, B + H - d]);
}
// Region above the floor (flat at Z = 0, cut 45 deg upward at both ends),
// shrunk d mm perpendicular to the floor and the cuts.
module sb_above_floor_2d(d) {
    B = sb_big(); L = sb_length(); cf = sb_front_chamfer(); cb = sb_back_chamfer();
    offset(delta = -d)
        polygon([[cf, 0], [L - cb, 0], [L - cb + B, B], [cf - B, B]]);
}
// Slab between perpendicular depths d1 < d2 below the top surface.
module sb_top_slab_2d(d1, d2)
    difference() { sb_below_top_2d(d1); sb_below_top_2d(d2); }

// extrude a YZ profile across the full box width (X)
module sb_yz(w = 400)
    rotate([90, 0, 90]) linear_extrude(height = w, center = true) children();

// plan outline (XY) extruded through everything
module sb_xy(h = 400)
    translate([0, 0, -h / 2]) linear_extrude(height = h) children();

// V ring reaching OUTWARD from the plan face at inward offset a_face, centred
// d_c below the top surface: depth d at its centre, 0 at +-h/2. Groove
// cutter (subtracted from the rim band) and lid bead (added) alike.
module sb_v_ring(d_c, h, a_face, d, n = 8) {
    dz = h / n;
    for (k = [0 : n - 1]) {
        zm = -h / 2 + (k + 0.5) * dz;
        dk = d * (1 - abs(zm) / (h / 2));
        intersection() {
            sb_xy() sb_band_2d(a_face - dk, a_face + 0.001);
            sb_yz() sb_top_slab_2d(d_c - h / 2 + k * dz - 0.0005,
                                   d_c - h / 2 + (k + 1) * dz + 0.0005);
        }
    }
}

// ---- parts (box frame, installed orientation) ---------------------------
module sand_ballast_bottom() {
    sb_assert_valid();
    lt = sb_lid_t();
    difference() {
        intersection() {
            union() {
                // thin shell: walls + floor (follows both end cuts), open on top
                difference() {
                    sb_xy() sb_outline_2d();
                    intersection() {
                        sb_xy() offset(delta = -sb_wall_t()) sb_outline_2d();
                        sb_yz() sb_above_floor_2d(sb_floor_t());
                    }
                }
                // rim band under the lid
                intersection() {
                    sb_xy() sb_band_2d(0, sb_rim_t());
                    sb_yz() sb_top_slab_2d(lt - 0.01, lt + sb_rim_h());
                }
                // 45 deg shoulder under the rim band (prints without support)
                sb_v_shoulder(lt + sb_rim_h());
            }
            // outer envelope: below the lid, above the board, both cuts
            sb_yz() intersection() {
                sb_below_top_2d(lt);
                sb_above_floor_2d(0);
            }
        }
        // click groove in the rim band's inner face
        sb_v_ring(lt + sb_snap_z(), sb_snap_h(), sb_rim_t() + 0.01, sb_groove_depth() + 0.01);
    }
}

module sb_v_shoulder(d_top, n = 8) {
    w = sb_rim_t() - sb_wall_t();
    dz = w / n;
    for (k = [0 : n - 1])
        intersection() {
            sb_xy() sb_band_2d(0, sb_rim_t() - (k + 0.5) * dz);
            sb_yz() sb_top_slab_2d(d_top + k * dz - 0.0005, d_top + (k + 1) * dz + 0.0005);
        }
}

// lid in its closed position: flat plate on top, skirt hanging inside the
// rim band.
module sand_ballast_lid() {
    sb_assert_valid();
    lt = sb_lid_t();
    a = sb_rim_t() + sb_skirt_fit();             // skirt outer face inset
    skirt_h = sb_rim_h() - 0.5;
    intersection() {
        union() {
            intersection() {
                sb_xy() sb_outline_2d();
                sb_yz() sb_top_slab_2d(0, lt);
            }
            intersection() {
                sb_xy() sb_band_2d(a, a + sb_skirt_t());
                sb_yz() sb_top_slab_2d(lt - 0.01, lt + skirt_h);
            }
            sb_v_ring(lt + sb_snap_z(), sb_snap_h(), a, sb_bead_depth());
        }
        sb_yz() sb_above_floor_2d(0);
    }
}

// ---- print poses ---------------------------------------------------------
// tray: floor on the bed (already); the end cuts rise off the bed at 45 deg.
// lid: flat plate on the bed, skirt up.
module sand_ballast_bottom_print() sand_ballast_bottom();
module sand_ballast_lid_print()
    translate([0, 0, sb_height()]) mirror([0, 0, 1]) sand_ballast_lid();

// Outer envelope of the closed box, as one solid (sim displacement).
module sand_ballast_envelope()
    intersection() {
        sb_xy() sb_outline_2d();
        sb_yz() intersection() { sb_below_top_2d(0); sb_above_floor_2d(0); }
    }

// The sand space of the closed box (sim fill level / volume estimates).
module sand_ballast_fill()
    difference() {
        sand_ballast_envelope();
        sand_ballast_bottom();
        sand_ballast_lid();
    }

// ---- closed box + installation into the ballast-local frame --------------
module sand_ballast_closed(colored = true) {
    color(colored ? [0.86, 0.74, 0.48] : [0.80, 0.80, 0.78]) sand_ballast_bottom();
    color(colored ? [0.95, 0.86, 0.60] : [0.88, 0.88, 0.86]) sand_ballast_lid();
}

// Floor on the board's inner face (ballast-local Z = t).
// what = "closed" (tray + lid), "envelope" (one outer solid) or "fill".
module sb_installed(colored = true, what = "closed")
    translate([bl_center_slot(), sb_y0_local(), p_wood_t()])
        if (what == "envelope") sand_ballast_envelope();
        else if (what == "fill") sand_ballast_fill();
        else sand_ballast_closed(colored);

module sand_ballast_echo()
    echo("SAND BALLAST: L x W x H = ", sb_length(), sb_width(), sb_height(),
         " | bottle gap = ", sb_bottle_gap(),
         " | fin slot w x len = ", sb_slot_w(), sb_slot_len(),
         " | arm w = ", sb_arm_w(),
         " | front / back bottom 45 deg cuts = ", sb_front_chamfer(), sb_back_chamfer(),
         " | end faces = ", sb_end_face_h());
// [bundle] end   <../../lib/sand_ballast.scad>

sand_ballast_echo();

if (part == "print") {
    sand_ballast_lid_print();
} else if (part == "closed") {
    sand_ballast_closed();
} else {
    assert(false, str("Unknown part: ", part));
}
